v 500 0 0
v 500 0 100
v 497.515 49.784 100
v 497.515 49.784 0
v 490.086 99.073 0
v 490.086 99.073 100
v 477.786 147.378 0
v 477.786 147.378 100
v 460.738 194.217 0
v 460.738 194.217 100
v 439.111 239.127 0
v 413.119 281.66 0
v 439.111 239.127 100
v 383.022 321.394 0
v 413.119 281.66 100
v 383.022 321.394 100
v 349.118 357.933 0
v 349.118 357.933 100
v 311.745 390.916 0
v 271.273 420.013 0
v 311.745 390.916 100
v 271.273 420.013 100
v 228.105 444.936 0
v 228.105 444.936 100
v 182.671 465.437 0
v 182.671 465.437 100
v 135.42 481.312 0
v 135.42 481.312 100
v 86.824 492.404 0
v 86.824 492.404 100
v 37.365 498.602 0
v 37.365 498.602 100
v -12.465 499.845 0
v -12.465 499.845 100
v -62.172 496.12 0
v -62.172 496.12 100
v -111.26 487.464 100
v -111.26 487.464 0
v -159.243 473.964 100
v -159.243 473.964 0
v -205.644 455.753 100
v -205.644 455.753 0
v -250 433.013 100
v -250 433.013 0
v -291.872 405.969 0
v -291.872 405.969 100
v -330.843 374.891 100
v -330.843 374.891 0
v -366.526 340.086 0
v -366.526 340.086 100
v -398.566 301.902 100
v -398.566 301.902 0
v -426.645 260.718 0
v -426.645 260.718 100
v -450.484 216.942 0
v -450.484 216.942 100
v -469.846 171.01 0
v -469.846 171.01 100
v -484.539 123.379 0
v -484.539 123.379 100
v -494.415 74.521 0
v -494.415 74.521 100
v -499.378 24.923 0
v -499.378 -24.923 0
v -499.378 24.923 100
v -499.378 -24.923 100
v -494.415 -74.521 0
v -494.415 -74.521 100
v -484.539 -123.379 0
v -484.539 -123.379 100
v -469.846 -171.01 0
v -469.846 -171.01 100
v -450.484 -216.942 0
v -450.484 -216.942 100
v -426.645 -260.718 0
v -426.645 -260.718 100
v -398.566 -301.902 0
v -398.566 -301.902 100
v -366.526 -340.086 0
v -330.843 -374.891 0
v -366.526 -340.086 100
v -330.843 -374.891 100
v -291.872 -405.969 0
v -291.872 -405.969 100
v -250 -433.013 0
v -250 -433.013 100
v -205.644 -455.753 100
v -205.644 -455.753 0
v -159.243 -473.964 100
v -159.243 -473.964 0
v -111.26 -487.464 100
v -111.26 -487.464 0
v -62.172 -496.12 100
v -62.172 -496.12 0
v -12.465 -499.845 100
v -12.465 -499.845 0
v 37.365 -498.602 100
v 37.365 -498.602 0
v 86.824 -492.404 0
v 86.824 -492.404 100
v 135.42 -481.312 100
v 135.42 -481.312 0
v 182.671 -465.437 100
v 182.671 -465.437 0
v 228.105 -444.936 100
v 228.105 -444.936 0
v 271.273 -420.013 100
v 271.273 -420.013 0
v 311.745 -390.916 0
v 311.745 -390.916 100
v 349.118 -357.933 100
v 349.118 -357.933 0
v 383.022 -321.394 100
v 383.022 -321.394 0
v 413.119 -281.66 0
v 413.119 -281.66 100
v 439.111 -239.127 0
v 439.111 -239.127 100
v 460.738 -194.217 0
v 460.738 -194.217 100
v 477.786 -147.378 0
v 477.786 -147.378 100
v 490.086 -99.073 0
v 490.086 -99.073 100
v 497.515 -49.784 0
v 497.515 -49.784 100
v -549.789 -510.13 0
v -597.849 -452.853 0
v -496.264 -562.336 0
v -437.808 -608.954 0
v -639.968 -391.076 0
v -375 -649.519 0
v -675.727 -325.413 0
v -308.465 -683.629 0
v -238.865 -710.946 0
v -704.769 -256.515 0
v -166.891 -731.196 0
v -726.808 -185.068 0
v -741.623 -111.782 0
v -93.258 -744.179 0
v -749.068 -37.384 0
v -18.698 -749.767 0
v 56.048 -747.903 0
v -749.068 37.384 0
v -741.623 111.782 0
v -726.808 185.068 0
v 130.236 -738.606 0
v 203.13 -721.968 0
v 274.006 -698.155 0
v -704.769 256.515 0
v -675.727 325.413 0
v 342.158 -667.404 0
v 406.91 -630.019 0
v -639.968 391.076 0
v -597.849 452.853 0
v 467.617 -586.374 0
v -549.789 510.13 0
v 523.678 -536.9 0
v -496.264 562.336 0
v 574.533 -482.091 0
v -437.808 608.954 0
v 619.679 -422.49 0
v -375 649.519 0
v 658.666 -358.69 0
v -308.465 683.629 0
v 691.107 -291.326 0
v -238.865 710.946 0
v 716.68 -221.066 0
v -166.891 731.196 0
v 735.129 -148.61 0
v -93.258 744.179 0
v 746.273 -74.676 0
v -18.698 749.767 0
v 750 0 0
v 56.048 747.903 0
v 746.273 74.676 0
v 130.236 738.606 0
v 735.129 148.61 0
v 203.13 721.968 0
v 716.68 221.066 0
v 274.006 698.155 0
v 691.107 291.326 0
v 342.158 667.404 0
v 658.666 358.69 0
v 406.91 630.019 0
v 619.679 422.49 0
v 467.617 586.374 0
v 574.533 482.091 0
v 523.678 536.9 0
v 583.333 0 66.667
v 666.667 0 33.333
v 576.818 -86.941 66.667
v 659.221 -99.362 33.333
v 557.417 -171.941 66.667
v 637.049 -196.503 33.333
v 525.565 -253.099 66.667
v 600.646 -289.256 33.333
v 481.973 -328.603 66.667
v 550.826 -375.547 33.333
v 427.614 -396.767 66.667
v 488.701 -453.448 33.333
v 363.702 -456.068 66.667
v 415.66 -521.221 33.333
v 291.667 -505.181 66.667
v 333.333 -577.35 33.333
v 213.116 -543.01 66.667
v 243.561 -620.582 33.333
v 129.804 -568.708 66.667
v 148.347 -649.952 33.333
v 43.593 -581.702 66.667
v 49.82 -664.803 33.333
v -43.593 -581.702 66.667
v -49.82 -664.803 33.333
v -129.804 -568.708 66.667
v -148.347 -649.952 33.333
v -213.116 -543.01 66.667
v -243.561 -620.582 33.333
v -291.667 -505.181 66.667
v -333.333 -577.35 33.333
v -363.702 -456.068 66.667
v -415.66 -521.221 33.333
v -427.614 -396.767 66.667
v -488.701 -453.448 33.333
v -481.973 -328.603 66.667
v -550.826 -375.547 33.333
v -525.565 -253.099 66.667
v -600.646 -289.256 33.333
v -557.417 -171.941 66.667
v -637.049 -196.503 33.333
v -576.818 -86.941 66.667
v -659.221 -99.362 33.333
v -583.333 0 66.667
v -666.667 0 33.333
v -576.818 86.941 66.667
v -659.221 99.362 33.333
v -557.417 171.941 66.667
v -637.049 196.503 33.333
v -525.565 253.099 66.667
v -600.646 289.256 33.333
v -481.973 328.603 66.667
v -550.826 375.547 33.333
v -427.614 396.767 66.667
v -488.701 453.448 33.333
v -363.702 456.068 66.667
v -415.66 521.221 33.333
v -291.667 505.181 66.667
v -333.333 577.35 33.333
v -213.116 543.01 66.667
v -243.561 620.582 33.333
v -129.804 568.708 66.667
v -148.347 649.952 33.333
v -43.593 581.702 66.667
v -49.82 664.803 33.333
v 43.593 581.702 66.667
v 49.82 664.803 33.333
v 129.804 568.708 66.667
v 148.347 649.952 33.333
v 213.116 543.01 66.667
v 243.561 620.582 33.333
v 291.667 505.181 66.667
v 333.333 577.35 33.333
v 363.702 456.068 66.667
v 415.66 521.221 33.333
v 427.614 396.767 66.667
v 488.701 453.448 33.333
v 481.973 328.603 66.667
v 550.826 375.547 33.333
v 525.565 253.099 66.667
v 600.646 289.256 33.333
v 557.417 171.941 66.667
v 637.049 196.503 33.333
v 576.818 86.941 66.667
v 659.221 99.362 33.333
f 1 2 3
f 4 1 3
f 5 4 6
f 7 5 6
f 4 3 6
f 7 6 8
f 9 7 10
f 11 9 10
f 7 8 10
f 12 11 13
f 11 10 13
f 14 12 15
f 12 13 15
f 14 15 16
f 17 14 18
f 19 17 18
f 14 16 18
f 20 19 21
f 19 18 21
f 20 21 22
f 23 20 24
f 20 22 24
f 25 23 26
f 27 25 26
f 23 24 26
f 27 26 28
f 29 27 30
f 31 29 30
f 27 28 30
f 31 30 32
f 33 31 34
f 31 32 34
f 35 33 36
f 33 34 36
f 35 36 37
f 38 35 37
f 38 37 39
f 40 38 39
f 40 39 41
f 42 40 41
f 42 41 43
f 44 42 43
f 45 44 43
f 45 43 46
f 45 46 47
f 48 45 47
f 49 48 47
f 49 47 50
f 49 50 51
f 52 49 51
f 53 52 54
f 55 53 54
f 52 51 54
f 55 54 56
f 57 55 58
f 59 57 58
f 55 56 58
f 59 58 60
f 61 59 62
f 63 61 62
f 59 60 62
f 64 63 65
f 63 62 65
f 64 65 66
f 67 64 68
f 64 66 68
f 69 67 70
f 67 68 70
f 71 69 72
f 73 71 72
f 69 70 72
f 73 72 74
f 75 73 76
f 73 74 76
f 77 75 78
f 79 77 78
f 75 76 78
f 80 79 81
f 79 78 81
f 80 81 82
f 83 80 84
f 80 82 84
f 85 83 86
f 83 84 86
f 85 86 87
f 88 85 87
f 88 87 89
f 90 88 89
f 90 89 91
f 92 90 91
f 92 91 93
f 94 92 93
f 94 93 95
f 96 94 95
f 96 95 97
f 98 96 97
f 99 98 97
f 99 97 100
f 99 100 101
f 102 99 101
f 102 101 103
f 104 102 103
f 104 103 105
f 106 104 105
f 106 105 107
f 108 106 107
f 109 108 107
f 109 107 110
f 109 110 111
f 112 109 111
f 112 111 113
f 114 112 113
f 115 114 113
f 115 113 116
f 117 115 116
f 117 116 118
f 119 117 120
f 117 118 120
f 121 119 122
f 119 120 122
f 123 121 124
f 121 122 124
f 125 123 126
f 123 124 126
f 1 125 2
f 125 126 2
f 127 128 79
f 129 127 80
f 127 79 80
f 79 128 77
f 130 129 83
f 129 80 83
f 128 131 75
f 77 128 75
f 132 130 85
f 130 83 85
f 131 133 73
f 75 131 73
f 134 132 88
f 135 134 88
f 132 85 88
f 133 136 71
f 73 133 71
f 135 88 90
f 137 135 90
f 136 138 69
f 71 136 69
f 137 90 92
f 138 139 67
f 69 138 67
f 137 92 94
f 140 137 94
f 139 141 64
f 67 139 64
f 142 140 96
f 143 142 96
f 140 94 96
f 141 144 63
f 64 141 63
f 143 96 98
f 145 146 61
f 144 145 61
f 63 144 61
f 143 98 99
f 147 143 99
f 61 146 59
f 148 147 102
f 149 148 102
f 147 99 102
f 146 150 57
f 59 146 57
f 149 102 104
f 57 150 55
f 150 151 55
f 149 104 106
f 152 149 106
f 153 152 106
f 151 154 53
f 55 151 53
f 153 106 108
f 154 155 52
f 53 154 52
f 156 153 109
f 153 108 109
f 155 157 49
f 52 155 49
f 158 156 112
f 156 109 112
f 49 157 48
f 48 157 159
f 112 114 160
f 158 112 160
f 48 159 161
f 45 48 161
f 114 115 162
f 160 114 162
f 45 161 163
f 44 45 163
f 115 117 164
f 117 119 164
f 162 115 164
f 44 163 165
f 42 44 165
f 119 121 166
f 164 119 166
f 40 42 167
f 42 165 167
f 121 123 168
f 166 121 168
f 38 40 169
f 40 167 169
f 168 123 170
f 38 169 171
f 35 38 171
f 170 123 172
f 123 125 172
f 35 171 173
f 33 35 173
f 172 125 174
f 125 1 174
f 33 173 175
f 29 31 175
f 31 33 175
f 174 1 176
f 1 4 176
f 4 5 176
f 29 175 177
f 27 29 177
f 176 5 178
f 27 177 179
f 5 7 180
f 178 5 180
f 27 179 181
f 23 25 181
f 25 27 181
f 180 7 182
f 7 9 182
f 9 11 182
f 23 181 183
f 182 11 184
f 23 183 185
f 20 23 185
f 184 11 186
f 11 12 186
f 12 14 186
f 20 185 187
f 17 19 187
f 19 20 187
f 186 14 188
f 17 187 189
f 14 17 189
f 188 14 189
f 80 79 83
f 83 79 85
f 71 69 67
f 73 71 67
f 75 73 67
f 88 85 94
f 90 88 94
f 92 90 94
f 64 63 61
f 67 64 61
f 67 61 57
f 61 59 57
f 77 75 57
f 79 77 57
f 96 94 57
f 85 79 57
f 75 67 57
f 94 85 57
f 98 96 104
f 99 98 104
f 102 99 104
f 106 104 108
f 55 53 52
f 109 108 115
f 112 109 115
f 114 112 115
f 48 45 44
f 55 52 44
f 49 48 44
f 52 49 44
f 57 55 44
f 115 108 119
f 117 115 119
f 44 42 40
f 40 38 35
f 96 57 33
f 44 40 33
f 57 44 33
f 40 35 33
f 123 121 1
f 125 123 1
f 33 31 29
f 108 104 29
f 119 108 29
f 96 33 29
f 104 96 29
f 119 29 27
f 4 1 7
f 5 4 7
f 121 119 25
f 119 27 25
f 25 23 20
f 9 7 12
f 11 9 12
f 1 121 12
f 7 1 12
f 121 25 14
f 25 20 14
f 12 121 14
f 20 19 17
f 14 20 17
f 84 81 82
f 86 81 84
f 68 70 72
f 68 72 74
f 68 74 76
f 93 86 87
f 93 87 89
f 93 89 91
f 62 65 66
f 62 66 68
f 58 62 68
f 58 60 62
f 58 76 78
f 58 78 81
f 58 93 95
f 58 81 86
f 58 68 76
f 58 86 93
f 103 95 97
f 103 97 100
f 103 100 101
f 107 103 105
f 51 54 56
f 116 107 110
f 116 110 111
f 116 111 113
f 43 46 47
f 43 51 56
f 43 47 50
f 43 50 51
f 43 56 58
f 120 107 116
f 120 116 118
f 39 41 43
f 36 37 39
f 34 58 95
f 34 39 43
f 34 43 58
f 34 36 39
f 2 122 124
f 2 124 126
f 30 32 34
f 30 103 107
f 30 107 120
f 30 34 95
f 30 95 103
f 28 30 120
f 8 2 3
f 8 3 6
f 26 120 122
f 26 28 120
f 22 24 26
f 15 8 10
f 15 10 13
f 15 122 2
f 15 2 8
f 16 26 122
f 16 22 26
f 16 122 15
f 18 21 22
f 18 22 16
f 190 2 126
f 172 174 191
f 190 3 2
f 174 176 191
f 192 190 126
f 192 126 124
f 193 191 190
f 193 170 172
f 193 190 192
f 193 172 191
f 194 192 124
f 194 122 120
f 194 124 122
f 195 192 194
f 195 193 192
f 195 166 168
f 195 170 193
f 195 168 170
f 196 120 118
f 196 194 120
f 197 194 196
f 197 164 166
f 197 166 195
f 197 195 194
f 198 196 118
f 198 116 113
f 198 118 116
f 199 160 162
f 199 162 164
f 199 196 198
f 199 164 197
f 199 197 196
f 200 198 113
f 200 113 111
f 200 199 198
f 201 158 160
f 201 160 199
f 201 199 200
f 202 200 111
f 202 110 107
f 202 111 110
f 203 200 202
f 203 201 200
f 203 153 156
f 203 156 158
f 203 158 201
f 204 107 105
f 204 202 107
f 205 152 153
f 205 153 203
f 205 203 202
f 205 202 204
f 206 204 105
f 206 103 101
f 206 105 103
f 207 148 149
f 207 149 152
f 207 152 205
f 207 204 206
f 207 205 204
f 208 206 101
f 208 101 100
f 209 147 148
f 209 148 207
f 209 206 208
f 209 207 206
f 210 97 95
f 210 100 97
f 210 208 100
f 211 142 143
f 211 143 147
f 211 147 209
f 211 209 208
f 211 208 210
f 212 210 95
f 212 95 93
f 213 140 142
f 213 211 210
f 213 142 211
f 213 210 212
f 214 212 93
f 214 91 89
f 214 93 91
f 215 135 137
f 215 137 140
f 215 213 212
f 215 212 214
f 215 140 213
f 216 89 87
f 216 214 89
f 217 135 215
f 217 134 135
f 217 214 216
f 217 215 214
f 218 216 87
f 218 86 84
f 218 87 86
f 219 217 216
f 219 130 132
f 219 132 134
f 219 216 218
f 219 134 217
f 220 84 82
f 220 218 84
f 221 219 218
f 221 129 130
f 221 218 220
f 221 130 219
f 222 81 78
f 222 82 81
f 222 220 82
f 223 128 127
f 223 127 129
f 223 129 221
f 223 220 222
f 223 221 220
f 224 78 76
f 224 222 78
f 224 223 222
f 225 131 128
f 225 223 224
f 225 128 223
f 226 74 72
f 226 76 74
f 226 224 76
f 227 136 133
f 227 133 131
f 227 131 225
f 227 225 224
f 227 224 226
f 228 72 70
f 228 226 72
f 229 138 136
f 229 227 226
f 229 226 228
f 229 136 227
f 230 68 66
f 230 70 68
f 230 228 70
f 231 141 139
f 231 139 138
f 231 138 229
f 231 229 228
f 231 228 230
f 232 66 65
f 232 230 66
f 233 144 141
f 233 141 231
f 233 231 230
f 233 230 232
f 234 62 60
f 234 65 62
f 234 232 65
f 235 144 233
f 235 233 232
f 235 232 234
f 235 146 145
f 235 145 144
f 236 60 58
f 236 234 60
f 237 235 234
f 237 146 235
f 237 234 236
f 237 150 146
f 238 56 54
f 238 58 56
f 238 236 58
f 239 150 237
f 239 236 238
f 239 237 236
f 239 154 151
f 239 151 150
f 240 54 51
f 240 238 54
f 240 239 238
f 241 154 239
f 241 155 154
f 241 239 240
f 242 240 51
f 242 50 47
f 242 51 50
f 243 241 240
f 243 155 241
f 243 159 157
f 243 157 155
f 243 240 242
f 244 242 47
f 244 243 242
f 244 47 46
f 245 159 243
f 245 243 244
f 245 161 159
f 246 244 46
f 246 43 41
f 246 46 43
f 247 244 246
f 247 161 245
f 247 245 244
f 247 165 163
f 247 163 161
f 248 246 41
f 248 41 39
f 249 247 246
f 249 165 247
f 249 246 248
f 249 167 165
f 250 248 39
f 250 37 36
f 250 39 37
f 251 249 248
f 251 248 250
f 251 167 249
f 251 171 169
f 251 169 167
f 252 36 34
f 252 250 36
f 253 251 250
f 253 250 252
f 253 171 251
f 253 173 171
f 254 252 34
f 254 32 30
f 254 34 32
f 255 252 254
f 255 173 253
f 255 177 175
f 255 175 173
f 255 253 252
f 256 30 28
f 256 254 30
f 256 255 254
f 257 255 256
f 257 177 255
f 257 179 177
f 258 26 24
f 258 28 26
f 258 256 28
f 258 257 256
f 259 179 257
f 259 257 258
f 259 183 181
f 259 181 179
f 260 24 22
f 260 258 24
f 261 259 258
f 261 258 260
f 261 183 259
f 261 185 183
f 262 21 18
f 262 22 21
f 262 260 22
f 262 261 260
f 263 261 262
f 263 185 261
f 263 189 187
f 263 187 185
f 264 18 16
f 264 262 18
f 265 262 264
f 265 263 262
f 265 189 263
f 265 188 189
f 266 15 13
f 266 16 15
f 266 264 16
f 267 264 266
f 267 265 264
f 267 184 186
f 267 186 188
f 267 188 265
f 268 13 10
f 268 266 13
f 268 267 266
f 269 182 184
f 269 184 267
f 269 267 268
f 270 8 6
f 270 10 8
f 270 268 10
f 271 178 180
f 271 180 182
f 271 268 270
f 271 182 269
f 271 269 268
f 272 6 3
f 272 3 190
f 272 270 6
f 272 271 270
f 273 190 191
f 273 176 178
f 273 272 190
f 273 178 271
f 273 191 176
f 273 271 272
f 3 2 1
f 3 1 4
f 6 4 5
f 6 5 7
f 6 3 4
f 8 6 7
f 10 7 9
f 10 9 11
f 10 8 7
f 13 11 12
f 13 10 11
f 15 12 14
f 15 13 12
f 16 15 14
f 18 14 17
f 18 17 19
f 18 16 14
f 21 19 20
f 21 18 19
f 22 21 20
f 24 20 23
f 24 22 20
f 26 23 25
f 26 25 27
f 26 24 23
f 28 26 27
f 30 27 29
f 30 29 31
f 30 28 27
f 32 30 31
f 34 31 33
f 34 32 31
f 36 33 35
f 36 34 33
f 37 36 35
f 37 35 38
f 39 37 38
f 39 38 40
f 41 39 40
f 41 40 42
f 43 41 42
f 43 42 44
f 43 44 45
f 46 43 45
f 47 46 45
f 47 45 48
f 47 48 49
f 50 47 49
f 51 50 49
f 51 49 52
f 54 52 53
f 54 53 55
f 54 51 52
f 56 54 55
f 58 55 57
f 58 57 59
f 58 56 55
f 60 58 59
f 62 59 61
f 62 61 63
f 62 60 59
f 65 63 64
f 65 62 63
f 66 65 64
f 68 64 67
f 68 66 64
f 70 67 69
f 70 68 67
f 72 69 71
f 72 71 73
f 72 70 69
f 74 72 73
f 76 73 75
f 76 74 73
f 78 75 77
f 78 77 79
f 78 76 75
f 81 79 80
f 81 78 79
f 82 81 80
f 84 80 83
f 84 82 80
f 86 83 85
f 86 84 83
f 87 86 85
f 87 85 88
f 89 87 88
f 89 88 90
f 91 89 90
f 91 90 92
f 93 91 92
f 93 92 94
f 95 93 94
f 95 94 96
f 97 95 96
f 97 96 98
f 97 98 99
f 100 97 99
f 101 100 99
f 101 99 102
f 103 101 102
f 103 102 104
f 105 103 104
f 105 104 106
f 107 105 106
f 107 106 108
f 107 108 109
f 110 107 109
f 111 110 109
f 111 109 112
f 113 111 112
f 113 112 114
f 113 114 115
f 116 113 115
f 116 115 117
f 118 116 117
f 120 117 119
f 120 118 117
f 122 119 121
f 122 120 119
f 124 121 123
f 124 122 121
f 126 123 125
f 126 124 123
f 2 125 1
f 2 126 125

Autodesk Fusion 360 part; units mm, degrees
sketch "スケッチ3" plane through (0, 0, 0) normal (0, 0, 1) x (1, 0, 0)
  circle A0 centre (0, 0) radius 750
  dimension "d8" = 1500
ref_plane "作業平面1" through (0, 0, 100) normal (0, 0, 1) x (1, 0, 0)
sketch "スケッチ6" plane through (0, 0, 100) normal (0, 0, 1) x (1, 0, 0)
  circle A0 centre (0, 0) radius 500
  dimension "d11" = 1000
loft "ロフト1" add profiles "スケッチ3", "スケッチ6" section 1 section 2 makes body 1
extrude "押し出し2" cut sketch "スケッチ6" against normal blind 100 bodies 1
extrude "押し出し3" add sketch "スケッチ6" against normal blind 100 separate body makes body 2
